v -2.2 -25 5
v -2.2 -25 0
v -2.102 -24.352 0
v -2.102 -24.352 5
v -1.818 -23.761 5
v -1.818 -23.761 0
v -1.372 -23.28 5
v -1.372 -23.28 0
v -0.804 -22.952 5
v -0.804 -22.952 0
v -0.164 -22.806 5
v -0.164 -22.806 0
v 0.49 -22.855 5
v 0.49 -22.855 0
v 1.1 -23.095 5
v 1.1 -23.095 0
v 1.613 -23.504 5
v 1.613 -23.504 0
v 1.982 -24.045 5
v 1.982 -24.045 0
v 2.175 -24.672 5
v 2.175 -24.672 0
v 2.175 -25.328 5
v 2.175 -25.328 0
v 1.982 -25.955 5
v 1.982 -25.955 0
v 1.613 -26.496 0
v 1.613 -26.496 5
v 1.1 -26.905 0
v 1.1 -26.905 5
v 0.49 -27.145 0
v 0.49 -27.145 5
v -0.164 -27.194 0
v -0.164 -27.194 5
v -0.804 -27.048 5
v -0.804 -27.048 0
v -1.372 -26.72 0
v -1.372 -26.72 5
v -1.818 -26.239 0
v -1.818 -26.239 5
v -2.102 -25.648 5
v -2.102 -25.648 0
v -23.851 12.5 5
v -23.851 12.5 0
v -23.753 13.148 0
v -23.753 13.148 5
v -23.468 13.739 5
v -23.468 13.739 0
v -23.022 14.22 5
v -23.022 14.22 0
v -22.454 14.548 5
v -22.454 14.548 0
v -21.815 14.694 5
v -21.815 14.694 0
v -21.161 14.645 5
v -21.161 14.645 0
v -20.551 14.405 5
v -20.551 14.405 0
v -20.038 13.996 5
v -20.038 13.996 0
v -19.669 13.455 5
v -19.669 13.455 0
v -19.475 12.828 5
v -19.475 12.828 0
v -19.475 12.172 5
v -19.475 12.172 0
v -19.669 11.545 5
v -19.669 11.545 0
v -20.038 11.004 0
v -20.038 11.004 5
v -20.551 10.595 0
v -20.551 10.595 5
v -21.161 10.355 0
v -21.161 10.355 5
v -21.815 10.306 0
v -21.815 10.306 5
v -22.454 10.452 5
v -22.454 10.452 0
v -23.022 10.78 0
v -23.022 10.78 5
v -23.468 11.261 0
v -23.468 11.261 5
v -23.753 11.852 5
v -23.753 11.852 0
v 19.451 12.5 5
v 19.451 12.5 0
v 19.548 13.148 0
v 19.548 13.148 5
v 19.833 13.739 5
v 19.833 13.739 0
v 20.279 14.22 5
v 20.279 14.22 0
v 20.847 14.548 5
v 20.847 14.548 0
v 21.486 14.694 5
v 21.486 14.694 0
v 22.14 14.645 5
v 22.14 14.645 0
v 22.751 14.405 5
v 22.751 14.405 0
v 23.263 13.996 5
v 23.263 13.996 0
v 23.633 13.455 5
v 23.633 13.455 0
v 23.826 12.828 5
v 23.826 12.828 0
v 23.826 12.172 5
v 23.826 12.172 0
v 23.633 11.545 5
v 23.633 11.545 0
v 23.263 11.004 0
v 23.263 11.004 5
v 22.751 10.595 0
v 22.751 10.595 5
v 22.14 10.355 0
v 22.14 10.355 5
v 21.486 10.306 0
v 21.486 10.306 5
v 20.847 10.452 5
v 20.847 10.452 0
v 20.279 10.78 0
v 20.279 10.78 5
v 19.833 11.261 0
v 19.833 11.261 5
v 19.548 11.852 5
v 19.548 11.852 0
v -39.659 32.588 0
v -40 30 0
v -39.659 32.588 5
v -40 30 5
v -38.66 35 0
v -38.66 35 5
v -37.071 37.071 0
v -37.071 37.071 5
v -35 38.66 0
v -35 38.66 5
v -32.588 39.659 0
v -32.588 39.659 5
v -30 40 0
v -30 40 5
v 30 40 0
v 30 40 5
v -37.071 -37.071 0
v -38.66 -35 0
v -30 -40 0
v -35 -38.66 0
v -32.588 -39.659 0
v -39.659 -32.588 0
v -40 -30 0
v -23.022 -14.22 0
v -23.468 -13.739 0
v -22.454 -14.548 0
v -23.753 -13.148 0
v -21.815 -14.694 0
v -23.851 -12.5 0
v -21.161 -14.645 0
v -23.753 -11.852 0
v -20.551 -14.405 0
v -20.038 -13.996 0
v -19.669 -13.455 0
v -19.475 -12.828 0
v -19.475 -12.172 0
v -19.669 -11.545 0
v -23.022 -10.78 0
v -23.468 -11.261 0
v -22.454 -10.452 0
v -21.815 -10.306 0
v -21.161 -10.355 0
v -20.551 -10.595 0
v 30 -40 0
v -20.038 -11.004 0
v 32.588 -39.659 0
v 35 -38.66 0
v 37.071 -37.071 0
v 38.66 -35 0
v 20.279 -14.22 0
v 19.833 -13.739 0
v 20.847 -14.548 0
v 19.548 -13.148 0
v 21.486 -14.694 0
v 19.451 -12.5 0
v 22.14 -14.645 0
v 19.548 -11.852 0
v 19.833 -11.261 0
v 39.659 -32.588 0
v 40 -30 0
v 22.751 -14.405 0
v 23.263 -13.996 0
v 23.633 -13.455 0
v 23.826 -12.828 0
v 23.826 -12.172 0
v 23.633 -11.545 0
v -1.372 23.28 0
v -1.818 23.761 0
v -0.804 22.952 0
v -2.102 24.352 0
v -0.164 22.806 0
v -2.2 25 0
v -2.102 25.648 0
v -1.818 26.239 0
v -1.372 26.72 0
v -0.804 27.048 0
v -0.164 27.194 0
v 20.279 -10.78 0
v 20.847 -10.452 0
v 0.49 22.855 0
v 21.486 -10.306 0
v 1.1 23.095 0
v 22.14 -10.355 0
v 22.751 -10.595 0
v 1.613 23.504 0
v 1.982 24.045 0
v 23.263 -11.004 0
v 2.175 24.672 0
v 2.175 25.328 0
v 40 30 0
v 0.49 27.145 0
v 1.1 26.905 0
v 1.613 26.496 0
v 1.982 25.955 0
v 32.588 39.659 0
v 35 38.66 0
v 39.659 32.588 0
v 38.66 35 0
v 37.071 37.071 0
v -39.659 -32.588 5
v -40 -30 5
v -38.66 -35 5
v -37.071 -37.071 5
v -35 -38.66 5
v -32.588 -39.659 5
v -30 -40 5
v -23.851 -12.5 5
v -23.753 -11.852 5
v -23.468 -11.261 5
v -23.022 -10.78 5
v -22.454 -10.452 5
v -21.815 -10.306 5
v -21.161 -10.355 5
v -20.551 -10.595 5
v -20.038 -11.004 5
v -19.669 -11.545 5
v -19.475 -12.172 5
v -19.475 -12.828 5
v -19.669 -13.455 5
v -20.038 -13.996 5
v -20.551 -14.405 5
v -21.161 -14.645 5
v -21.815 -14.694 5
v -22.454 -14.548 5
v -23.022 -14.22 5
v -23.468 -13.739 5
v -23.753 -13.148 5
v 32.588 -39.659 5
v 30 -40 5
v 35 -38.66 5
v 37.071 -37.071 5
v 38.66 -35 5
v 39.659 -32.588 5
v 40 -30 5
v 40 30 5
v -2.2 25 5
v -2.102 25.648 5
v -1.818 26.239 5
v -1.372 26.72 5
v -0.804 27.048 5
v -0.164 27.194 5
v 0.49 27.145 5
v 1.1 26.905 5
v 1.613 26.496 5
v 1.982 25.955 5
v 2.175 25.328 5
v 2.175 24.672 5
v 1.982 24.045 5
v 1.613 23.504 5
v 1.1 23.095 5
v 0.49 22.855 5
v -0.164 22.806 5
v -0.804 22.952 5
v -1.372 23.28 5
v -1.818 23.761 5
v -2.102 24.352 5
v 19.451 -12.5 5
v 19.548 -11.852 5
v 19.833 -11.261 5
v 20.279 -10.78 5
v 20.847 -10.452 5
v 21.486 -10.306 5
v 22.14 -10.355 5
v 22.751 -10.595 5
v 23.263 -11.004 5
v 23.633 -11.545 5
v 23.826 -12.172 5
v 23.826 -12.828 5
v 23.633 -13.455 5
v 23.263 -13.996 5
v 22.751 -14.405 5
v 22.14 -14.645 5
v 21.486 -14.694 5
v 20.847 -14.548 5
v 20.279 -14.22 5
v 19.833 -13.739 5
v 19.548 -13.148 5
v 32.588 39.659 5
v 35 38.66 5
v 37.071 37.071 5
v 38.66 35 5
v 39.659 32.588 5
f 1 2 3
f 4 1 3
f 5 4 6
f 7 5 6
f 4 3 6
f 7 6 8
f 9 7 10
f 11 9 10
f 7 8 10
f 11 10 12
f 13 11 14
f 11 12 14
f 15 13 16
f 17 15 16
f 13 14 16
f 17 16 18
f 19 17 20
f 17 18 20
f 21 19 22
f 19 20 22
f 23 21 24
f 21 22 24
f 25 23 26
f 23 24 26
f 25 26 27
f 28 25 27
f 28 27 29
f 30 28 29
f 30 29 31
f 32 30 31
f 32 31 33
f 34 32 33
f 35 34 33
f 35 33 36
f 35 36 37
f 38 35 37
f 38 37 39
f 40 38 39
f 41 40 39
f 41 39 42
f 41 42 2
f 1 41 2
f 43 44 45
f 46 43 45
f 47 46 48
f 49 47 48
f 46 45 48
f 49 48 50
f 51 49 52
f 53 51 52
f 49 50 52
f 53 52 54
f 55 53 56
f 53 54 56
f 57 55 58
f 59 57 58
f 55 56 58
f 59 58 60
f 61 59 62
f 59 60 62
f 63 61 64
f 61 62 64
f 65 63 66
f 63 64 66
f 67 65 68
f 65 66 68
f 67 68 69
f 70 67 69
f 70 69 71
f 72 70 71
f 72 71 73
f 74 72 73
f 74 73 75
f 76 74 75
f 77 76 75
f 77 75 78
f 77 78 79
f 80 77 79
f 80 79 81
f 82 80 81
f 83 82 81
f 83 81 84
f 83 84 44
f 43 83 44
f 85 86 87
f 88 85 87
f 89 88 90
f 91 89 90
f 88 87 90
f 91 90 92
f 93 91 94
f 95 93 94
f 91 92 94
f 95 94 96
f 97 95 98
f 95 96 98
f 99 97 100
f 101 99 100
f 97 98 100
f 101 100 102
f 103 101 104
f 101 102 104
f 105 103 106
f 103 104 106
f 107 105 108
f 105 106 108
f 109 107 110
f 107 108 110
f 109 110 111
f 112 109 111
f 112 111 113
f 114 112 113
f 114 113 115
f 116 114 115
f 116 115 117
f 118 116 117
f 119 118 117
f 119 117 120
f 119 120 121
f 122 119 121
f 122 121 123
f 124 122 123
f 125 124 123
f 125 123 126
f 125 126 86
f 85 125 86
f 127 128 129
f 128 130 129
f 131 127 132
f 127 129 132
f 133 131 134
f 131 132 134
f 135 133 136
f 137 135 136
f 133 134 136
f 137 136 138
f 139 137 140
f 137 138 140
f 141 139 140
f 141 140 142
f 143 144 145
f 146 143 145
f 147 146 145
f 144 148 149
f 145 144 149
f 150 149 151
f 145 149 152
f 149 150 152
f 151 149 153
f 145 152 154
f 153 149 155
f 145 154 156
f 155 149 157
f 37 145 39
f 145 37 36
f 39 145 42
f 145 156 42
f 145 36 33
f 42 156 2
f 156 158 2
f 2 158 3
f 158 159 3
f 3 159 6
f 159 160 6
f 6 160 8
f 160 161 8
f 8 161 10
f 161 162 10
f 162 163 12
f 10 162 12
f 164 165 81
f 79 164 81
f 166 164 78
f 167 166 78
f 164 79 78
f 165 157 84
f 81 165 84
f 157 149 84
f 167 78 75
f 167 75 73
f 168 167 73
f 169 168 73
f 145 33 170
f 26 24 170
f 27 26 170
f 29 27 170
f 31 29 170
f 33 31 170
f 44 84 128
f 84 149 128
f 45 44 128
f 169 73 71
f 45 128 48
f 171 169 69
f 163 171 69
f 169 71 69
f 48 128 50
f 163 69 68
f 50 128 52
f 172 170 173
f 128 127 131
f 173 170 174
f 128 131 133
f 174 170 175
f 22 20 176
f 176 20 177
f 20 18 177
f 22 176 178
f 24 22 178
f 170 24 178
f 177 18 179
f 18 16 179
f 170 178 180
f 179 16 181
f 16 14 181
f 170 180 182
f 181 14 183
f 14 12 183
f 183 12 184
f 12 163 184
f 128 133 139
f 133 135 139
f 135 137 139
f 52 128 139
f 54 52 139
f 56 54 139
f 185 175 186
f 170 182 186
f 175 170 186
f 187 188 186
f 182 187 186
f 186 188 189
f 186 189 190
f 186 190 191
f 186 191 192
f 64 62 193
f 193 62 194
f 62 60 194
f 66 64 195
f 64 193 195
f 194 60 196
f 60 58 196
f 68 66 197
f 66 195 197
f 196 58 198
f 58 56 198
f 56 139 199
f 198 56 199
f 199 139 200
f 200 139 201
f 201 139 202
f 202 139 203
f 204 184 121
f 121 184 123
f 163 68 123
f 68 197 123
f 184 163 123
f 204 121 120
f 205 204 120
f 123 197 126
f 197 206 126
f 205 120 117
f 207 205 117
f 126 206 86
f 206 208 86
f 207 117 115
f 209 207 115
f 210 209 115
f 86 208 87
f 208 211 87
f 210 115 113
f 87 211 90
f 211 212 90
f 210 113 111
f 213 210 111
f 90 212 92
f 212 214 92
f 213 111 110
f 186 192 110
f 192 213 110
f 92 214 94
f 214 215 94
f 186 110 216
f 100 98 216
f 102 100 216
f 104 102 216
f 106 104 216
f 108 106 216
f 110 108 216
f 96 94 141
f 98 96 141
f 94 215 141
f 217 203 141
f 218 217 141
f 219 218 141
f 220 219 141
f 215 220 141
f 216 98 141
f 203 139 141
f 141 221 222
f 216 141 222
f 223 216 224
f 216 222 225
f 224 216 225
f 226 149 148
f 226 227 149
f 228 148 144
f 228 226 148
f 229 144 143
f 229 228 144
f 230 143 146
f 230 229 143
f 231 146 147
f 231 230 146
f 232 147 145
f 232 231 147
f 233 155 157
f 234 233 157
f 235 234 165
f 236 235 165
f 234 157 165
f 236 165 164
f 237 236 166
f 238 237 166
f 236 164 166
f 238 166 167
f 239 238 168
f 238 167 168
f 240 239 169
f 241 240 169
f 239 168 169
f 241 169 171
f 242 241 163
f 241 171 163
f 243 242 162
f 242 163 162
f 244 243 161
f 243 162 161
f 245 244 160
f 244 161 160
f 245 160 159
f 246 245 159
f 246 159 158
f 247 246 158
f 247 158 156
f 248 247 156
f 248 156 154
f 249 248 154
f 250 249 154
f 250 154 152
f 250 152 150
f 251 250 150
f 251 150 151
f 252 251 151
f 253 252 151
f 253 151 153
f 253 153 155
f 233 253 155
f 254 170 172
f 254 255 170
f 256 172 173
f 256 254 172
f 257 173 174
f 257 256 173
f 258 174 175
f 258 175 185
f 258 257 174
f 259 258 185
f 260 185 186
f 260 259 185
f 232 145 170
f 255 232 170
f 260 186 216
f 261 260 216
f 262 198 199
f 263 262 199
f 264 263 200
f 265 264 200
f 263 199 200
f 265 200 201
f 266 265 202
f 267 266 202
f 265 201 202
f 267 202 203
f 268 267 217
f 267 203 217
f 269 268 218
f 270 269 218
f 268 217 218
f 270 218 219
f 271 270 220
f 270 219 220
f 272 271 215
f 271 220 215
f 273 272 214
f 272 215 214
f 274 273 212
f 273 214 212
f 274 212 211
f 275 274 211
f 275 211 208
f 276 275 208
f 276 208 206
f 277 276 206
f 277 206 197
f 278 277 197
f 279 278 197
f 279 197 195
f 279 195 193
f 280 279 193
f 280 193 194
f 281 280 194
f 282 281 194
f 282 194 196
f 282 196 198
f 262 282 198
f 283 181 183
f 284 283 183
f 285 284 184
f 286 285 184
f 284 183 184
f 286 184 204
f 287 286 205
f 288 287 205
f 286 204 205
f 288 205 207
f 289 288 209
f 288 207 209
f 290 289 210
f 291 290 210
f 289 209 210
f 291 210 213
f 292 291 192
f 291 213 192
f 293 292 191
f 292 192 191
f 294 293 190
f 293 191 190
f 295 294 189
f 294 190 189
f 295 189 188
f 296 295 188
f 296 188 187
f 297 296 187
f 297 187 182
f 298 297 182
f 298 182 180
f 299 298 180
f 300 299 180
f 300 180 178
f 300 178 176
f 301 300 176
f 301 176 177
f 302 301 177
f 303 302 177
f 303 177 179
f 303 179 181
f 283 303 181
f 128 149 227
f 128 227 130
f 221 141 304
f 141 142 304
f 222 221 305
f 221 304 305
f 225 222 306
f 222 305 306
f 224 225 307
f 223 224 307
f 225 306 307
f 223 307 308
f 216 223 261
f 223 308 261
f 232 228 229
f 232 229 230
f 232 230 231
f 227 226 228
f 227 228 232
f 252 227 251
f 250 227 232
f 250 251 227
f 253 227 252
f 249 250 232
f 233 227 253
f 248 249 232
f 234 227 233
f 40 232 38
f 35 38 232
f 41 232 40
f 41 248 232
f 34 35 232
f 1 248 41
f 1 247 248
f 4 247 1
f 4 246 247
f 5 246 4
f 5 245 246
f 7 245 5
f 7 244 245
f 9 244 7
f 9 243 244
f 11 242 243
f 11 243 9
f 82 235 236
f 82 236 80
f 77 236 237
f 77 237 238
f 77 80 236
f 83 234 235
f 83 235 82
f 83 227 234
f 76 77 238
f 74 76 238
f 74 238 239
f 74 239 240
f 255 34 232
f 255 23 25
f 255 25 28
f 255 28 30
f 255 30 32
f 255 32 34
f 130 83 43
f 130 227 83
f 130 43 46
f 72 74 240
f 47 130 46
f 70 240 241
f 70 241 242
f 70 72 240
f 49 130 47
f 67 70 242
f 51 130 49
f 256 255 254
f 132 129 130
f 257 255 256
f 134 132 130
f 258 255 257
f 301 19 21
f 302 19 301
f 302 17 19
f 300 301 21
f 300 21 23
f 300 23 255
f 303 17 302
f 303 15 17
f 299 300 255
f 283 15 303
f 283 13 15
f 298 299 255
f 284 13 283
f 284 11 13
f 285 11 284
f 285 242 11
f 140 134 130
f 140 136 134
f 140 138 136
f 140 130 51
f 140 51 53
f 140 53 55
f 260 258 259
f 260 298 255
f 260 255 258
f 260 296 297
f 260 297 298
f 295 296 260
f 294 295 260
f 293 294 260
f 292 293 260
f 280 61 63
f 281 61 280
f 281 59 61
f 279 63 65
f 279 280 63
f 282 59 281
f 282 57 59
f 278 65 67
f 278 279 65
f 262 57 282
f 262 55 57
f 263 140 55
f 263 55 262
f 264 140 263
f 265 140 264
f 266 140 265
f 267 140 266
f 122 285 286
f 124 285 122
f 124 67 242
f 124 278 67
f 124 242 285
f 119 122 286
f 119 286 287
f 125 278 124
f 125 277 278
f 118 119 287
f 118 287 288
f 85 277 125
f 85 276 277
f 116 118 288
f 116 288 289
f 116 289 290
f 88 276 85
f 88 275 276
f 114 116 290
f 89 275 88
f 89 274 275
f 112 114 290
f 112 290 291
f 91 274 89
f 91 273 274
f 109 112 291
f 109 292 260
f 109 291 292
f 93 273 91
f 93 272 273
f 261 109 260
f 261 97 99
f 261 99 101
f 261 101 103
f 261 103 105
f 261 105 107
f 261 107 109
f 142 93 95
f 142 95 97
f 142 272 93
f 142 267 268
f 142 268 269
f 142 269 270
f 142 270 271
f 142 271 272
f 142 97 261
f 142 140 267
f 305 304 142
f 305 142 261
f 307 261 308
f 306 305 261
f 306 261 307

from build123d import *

# Parameters (mm, degrees)
F0_W     = 80
F0_H     = 80
F1_DEPTH = 5
F3_D     = 4.4
F4_R     = 10


with BuildPart() as f1:
    # F0 (on Top) → F1 (new body)
    with BuildSketch(Plane.XY):
        Rectangle(F0_W, F0_H)
    extrude(amount=F1_DEPTH)

    # F3 (through all)
    with Locations(Plane.XY.offset(5)):
        with Locations((0, 25), (21.650635, 12.5), (21.650635, -12.5), (0, -25), (-21.650635, -12.5), (-21.650635, 12.5)):
            Hole(F3_D / 2)

    # F4
    f4_edges = [f1.edges().sort_by_distance(p)[0] for p in [
        (40, -40, 2.5),
        (40, 40, 2.5),
        (-40, -40, 2.5),
        (-40, 40, 2.5),
    ]]
    fillet(f4_edges, radius=F4_R)


solid = f1.part
